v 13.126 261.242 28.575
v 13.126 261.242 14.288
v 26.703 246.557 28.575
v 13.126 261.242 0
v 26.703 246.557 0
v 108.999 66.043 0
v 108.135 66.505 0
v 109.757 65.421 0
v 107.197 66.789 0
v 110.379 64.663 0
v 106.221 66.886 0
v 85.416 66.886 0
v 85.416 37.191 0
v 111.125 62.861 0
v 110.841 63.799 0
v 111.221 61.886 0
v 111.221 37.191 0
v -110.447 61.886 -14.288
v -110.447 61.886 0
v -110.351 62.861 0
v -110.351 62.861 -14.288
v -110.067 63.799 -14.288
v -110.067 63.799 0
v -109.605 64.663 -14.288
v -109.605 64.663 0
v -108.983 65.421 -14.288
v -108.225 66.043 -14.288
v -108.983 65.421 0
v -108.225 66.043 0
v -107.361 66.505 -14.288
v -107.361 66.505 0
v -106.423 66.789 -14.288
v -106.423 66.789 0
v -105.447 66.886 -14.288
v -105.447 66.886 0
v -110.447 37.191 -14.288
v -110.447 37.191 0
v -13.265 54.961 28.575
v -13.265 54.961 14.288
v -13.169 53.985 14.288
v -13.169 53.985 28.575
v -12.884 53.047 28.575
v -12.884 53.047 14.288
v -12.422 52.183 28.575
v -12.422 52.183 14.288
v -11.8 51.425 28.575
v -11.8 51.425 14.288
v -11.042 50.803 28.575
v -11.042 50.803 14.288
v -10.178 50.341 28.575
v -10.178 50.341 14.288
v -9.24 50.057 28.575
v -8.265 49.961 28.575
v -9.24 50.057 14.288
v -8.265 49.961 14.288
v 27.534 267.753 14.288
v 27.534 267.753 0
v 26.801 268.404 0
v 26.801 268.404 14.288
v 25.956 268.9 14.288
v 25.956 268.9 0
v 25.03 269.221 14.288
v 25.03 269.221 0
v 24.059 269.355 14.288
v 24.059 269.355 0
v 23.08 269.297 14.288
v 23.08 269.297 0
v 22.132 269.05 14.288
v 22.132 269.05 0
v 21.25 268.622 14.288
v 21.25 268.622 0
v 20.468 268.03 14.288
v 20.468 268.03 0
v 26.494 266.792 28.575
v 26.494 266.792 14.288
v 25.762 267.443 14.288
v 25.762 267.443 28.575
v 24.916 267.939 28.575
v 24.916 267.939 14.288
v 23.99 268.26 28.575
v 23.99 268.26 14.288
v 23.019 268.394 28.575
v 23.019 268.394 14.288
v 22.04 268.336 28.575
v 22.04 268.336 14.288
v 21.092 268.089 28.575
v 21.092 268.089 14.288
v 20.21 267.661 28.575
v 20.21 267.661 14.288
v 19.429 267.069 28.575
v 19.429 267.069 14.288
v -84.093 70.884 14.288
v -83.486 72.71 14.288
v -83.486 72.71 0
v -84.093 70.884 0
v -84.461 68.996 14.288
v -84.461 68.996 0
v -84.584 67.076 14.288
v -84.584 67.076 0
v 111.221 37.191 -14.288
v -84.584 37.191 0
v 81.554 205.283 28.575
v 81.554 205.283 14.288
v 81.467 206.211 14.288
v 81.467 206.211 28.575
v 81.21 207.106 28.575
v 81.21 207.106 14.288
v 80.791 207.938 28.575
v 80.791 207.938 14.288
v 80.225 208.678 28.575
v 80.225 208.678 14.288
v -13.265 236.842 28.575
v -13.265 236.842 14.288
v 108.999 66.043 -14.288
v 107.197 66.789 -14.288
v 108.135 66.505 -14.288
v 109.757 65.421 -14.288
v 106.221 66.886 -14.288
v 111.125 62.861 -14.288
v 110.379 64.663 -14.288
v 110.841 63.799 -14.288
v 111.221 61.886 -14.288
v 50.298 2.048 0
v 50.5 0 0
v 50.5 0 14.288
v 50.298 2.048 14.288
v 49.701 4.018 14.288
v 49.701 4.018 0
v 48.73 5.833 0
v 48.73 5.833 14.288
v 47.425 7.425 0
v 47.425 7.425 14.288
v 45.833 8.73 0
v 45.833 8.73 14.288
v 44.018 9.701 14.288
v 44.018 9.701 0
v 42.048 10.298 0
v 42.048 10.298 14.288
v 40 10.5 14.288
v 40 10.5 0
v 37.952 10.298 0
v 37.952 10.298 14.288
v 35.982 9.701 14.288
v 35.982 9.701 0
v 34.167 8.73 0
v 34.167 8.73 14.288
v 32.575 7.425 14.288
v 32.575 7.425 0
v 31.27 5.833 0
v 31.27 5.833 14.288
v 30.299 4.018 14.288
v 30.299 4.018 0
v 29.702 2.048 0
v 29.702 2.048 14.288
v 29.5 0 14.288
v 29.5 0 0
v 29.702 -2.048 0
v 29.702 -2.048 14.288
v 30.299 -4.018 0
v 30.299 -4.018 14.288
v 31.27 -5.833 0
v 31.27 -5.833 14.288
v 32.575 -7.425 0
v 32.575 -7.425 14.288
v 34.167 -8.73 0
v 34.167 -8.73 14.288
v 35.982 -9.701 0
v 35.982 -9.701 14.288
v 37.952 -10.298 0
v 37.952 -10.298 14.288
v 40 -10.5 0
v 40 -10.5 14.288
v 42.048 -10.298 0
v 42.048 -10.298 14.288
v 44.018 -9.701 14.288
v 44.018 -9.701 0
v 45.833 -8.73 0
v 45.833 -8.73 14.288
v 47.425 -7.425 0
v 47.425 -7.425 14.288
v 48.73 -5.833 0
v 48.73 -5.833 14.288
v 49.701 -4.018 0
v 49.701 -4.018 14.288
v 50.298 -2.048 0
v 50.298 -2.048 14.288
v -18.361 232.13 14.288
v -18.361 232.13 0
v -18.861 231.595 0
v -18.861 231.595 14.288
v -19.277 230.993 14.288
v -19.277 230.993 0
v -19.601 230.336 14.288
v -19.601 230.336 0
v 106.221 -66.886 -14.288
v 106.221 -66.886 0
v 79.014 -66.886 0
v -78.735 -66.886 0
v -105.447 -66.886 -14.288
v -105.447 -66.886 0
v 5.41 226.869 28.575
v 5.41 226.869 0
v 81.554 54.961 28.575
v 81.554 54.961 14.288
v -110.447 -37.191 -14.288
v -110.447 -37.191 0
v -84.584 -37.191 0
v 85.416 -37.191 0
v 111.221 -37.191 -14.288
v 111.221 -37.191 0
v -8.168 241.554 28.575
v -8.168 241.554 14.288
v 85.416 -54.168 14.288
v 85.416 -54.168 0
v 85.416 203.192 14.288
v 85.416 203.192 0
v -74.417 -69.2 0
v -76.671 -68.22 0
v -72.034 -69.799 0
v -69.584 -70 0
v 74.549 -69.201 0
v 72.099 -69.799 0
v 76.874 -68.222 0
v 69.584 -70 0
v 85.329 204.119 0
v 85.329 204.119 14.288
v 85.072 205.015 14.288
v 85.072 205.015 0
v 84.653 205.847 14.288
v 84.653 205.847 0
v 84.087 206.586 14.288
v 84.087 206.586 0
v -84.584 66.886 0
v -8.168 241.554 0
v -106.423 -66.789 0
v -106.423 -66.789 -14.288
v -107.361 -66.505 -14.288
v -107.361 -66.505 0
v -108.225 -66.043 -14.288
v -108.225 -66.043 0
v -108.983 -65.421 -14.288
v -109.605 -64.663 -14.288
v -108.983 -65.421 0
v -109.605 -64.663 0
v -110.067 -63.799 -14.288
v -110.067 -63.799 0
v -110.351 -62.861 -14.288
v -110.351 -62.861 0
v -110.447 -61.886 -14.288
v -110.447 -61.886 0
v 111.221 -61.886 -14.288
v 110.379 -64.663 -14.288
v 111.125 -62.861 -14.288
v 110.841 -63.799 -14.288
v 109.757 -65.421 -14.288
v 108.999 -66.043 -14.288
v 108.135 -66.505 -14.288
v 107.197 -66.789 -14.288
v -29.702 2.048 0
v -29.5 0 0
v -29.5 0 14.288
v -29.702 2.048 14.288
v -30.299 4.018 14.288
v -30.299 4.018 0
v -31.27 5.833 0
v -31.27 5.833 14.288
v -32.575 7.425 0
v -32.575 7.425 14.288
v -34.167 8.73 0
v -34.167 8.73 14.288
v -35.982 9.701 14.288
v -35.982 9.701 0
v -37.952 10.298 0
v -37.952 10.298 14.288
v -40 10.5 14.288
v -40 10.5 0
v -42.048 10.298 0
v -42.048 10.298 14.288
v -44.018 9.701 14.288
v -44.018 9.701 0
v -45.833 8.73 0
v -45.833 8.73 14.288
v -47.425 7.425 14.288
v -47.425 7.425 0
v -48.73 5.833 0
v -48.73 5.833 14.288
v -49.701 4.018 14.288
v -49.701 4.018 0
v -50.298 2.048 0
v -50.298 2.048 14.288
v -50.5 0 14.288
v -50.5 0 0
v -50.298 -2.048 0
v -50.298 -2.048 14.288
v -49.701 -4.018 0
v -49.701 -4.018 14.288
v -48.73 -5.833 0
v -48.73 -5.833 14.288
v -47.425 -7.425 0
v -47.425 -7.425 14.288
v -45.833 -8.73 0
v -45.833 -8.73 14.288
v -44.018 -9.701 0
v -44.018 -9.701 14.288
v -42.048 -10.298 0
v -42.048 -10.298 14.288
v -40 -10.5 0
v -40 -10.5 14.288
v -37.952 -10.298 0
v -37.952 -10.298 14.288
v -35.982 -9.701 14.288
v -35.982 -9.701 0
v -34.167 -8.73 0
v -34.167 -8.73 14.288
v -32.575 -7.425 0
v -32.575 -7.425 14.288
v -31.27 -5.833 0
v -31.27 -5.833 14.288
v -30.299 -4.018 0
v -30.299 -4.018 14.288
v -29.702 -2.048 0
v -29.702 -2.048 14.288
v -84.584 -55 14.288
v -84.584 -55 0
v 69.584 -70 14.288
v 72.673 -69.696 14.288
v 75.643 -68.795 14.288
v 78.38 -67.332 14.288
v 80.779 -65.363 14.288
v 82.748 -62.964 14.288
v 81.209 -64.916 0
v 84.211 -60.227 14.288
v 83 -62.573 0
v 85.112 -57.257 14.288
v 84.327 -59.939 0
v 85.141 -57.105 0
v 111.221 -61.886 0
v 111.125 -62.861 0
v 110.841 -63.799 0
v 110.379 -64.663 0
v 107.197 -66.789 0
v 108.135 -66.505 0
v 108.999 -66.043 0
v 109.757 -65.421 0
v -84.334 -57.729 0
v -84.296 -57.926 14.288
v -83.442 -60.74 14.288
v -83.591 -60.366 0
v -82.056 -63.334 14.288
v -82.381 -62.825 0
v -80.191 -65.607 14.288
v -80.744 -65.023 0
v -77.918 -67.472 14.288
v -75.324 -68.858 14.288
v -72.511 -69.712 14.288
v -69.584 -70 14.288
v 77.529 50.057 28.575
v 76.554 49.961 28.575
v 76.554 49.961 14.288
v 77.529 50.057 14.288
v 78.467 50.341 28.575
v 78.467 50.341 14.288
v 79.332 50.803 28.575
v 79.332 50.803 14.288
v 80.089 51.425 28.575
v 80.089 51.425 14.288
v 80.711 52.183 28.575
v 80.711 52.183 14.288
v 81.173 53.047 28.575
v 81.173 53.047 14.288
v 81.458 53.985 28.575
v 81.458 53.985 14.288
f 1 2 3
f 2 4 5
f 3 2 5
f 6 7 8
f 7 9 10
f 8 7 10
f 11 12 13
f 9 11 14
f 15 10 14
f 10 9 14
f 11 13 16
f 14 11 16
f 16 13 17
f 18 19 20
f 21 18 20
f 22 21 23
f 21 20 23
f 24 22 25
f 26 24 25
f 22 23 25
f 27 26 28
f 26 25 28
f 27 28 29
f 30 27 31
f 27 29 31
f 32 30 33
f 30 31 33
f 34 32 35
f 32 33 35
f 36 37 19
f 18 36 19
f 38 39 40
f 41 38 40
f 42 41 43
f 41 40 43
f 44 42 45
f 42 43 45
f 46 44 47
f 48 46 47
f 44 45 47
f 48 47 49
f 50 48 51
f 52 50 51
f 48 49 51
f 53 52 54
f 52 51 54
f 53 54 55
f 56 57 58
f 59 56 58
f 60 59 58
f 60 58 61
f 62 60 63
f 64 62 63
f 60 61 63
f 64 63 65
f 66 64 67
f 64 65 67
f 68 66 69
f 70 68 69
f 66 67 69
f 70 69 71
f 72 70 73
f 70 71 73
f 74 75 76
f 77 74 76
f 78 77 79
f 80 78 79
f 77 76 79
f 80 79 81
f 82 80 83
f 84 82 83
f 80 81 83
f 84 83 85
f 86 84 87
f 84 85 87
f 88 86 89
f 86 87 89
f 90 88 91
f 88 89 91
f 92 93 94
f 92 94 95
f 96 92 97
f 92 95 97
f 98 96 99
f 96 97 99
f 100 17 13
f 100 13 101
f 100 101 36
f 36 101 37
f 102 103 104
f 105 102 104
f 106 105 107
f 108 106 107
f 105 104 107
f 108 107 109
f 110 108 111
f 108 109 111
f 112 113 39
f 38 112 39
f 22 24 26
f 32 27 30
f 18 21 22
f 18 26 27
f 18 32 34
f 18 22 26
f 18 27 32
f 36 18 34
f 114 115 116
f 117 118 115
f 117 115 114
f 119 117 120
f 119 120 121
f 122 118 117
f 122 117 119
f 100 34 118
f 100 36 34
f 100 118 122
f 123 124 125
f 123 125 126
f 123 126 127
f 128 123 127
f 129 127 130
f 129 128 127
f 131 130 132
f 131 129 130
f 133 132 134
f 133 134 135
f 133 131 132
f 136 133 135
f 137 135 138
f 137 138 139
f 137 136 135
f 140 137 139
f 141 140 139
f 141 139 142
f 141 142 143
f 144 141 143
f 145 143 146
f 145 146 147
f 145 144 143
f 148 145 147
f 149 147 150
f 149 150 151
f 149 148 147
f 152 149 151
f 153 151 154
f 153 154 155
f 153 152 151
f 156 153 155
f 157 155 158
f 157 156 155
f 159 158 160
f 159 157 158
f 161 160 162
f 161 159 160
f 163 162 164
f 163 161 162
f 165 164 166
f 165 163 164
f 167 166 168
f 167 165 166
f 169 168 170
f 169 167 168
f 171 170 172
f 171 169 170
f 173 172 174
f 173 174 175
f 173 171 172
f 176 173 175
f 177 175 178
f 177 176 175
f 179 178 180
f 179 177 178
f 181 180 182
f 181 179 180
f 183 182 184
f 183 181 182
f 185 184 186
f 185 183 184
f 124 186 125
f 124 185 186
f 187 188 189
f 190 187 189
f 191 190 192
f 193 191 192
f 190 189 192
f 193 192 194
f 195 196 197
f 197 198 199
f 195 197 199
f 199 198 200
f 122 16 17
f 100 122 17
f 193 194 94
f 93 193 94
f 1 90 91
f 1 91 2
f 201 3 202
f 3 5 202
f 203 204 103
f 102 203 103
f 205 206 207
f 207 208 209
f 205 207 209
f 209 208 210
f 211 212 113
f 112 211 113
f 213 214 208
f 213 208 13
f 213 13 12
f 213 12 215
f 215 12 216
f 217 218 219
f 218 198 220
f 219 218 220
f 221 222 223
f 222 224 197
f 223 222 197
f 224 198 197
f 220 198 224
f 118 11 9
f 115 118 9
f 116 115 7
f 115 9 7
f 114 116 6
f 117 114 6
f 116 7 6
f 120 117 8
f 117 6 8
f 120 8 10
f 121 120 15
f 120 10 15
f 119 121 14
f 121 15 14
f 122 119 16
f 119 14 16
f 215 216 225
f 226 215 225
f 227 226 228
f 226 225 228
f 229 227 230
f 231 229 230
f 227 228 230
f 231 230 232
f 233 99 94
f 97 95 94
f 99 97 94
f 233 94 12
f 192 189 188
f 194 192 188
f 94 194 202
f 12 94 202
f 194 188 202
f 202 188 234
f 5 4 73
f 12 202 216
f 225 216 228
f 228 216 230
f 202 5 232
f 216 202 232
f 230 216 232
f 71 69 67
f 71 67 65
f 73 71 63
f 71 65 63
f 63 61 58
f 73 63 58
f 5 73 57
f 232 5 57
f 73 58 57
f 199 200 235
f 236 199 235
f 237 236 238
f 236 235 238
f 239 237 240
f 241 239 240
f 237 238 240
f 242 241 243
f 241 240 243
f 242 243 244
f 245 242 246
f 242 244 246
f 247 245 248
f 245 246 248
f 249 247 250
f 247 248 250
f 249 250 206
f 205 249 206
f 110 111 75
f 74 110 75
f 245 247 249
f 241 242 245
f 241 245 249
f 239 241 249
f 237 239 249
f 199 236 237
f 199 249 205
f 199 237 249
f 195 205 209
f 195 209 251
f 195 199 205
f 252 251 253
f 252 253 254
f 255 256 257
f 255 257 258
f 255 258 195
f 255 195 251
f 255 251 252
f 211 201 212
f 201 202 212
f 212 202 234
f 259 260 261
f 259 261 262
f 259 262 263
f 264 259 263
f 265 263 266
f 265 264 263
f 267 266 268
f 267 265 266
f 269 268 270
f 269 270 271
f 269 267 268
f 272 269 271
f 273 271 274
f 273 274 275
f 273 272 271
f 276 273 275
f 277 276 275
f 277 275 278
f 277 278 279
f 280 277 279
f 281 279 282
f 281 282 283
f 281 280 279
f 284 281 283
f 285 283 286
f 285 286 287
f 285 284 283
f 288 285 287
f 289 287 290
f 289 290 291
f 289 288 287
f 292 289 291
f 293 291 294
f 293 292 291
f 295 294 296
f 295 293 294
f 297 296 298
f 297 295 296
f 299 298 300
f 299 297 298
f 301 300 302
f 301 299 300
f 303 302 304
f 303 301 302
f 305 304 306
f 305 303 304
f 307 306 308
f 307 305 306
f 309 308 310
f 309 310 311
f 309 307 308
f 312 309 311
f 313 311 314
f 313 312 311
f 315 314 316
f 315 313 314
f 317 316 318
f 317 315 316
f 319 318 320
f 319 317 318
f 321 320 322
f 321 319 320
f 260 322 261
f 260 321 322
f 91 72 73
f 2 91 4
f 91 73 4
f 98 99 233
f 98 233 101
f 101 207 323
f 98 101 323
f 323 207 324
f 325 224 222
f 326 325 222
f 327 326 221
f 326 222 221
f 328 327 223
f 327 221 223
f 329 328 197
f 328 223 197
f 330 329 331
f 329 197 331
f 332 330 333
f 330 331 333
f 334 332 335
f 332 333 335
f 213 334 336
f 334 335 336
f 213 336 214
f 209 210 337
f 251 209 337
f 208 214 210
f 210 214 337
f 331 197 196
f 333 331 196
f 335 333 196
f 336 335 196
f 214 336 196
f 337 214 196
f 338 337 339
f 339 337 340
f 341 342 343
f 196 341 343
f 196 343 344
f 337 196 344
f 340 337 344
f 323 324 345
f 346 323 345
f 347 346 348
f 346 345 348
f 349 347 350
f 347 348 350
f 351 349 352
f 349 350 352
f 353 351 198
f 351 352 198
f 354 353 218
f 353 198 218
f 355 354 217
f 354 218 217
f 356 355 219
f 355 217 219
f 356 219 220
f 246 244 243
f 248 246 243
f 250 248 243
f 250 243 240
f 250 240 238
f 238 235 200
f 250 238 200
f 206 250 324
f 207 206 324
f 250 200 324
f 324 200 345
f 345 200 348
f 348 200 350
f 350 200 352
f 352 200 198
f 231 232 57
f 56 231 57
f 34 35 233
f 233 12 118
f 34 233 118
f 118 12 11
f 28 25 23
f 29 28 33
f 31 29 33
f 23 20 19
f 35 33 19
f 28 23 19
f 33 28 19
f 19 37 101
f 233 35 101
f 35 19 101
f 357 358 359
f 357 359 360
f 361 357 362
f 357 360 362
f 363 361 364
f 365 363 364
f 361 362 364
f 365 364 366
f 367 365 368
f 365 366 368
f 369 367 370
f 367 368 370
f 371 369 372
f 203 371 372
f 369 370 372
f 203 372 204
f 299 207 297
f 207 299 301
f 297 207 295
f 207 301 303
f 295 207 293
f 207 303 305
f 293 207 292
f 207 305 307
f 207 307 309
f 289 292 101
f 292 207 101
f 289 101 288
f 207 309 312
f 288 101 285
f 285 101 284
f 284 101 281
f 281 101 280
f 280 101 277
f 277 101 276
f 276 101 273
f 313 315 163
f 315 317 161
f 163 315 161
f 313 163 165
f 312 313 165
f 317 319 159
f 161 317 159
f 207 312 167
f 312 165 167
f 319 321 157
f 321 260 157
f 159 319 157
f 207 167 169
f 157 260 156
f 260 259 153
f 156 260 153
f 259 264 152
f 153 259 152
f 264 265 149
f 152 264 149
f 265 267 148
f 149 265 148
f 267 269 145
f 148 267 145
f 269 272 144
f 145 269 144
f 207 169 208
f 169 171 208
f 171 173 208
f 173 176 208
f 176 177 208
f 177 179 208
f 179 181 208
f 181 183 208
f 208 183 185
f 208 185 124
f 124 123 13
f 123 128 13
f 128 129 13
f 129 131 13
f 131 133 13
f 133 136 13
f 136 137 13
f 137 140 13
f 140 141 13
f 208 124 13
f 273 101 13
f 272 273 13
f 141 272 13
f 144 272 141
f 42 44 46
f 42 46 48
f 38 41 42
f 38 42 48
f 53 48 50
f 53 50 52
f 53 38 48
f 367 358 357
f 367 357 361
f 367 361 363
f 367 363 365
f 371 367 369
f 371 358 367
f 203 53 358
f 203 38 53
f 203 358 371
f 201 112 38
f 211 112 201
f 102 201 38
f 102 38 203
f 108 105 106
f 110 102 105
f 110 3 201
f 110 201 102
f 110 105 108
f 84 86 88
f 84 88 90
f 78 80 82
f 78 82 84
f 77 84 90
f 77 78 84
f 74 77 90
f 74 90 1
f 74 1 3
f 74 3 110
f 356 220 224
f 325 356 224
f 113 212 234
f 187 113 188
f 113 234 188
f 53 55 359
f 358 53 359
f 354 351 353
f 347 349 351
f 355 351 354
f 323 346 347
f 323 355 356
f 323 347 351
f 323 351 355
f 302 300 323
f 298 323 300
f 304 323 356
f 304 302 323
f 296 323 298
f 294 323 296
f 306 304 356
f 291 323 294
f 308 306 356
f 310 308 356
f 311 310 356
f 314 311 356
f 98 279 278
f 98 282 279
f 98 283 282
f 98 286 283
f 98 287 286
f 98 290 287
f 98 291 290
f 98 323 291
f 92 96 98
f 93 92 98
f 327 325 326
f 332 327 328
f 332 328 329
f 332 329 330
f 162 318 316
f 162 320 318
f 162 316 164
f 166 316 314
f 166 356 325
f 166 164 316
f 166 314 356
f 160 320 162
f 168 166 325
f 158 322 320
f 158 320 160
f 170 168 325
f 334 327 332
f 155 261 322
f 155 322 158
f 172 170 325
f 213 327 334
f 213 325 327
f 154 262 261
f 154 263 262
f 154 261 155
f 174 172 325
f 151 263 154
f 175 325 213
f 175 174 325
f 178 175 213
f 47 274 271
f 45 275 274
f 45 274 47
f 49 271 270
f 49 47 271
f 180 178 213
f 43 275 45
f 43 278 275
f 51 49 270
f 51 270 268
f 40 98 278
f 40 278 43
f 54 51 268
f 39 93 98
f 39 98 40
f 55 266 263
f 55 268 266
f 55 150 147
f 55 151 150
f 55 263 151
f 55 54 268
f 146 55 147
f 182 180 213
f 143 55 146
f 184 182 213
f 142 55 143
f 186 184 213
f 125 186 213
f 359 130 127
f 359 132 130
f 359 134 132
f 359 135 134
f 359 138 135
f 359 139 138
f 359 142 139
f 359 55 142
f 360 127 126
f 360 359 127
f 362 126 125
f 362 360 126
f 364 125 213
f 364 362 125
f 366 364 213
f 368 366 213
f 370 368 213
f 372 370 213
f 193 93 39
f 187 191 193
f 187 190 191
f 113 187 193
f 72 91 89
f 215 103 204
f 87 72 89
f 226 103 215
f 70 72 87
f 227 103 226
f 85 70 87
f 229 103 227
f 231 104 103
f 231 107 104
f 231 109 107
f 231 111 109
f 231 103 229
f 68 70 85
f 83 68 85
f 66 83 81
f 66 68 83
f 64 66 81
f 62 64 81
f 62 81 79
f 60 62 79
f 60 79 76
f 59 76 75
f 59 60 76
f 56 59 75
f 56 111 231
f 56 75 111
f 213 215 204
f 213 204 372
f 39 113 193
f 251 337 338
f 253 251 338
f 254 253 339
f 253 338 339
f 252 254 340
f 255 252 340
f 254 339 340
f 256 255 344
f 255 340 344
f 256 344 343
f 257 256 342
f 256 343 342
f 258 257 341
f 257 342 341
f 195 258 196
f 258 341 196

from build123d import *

# Parameters (mm, degrees)
F0_R     = 10.5
F1_DEPTH = 14.2875
F2_W     = 170
F2_H     = 29.6946875751
F3_DEPTH = 14.2875
F5_DEPTH = 14.2875


# Not quite as in the source:
# - a length typed as a fraction of an inch, garbled in the dataset ("3 / 203.2 mm" for 3/8 in), is restored
# - a feature names something its author has since deleted; it is built from what else it names


with BuildPart() as f1:
    # F0 (on Top) → F1 (new body)
    with BuildSketch(Plane.XY):
        with BuildLine():
            ThreePointArc((-84.5842045546, -55), (-80.1908062724, -65.6066017178), (-69.5842045546, -70))
            Line((-69.5842045546, -70), (69.5842045546, -70))
            ThreePointArc((69.5842045546, -70), (80.7788298305, -65.363034385), (85.4157954454, -54.1684091091))
            Line((85.4157954454, -54.1684091091), (85.4157954454, 203.1919921827))
            ThreePointArc((85.4157954454, 203.1919921827), (85.0717839963, 205.0145647093), (84.0870871996, 206.5863429094))
            Line((84.0870871996, 206.5863429094), (27.5340619023, 267.7534620916))
            ThreePointArc((27.5340619023, 267.7534620916), (24.0585970267, 269.3552750765), (20.4684194215, 268.030403119))
            Line((20.4684194215, 268.030403119), (13.1258359132, 261.2417016656))
            Line((13.1258359132, 261.2417016656), (26.70323882, 246.556534649))
            Line((26.70323882, 246.556534649), (16.0564927329, 236.7129175415))
            Line((16.0564927329, 236.7129175415), (5.4097466459, 226.8693004341))
            Line((5.4097466459, 226.8693004341), (-8.1676562609, 241.5544674507))
            Line((-8.1676562609, 241.5544674507), (-18.3614984488, 232.1295897903))
            ThreePointArc((-18.3614984488, 232.1295897903), (-19.0801780579, 231.3013565049), (-19.6010257192, 230.336375433))
            Line((-19.6010257192, 230.336375433), (-83.4858385457, 72.7100555545))
            ThreePointArc((-83.4858385457, 72.7100555545), (-84.3070526124, 69.9459705844), (-84.5842045546, 67.0758233641))
            Line((-84.5842045546, 67.0758233641), (-84.5842045546, -55))
        make_face()
        with Locations((-40, 0)):
            Circle(F0_R, mode=Mode.SUBTRACT)
        with Locations((40, 0)):
            Circle(F0_R, mode=Mode.SUBTRACT)
    extrude(amount=F1_DEPTH)

    # F2 (on face) → F3 (join)
    with BuildSketch(Plane(origin=(0, 0, 0), x_dir=(1, 0, 0), z_dir=(0, 0, -1))):
        with BuildLine():
            ThreePointArc((-110.4471534491, -61.8855160475), (-108.982687355, -65.4210499534), (-105.4471534491, -66.8855160475))
            Line((-105.4471534491, -66.8855160475), (-84.5842045546, -66.8855160475))
            Line((-84.5842045546, -66.8855160475), (-84.5842045546, -37.1908284724))
            Line((-84.5842045546, -37.1908284724), (-110.4471534491, -37.1908284724))
            Line((-110.4471534491, -37.1908284724), (-110.4471534491, -61.8855160475))
        make_face()
        with Locations((0.4157954454, -52.0381722599)):
            Rectangle(F2_W, F2_H)
        with BuildLine():
            Line((85.4157954454, -37.1908284724), (85.4157954454, -66.8855160475))
            Line((85.4157954454, -66.8855160475), (106.2211793661, -66.8855160475))
            ThreePointArc((106.2211793661, -66.8855160475), (109.756713272, -65.4210499534), (111.2211793661, -61.8855160475))
            Line((111.2211793661, -61.8855160475), (111.2211793661, -37.1908284724))
            Line((111.2211793661, -37.1908284724), (85.4157954454, -37.1908284724))
        make_face()
        with BuildLine():
            Line((-84.5842045546, 55), (-84.5842045546, 37.1908284724))
            Line((-84.5842045546, 37.1908284724), (85.4157954454, 37.1908284724))
            Line((85.4157954454, 37.1908284724), (85.4157954454, 54.1684091091))
            ThreePointArc((85.4157954454, 54.1684091091), (83.7249684911, 61.287261926), (79.0136510523, 66.8855160475))
            Line((79.0136510523, 66.8855160475), (-78.7348607215, 66.8855160475))
            ThreePointArc((-78.7348607215, 66.8855160475), (-83.0426562208, 61.623449158), (-84.5842045546, 55))
        make_face()
        with BuildLine():
            Line((-110.4471534491, 37.1908284724), (-84.5842045546, 37.1908284724))
            Line((-84.5842045546, 37.1908284724), (-84.5842045546, 55))
            ThreePointArc((-84.5842045546, 55), (-83.0426562208, 61.623449158), (-78.7348607215, 66.8855160475))
            Line((-78.7348607215, 66.8855160475), (-105.4471534491, 66.8855160475))
            ThreePointArc((-105.4471534491, 66.8855160475), (-108.982687355, 65.4210499534), (-110.4471534491, 61.8855160475))
            Line((-110.4471534491, 61.8855160475), (-110.4471534491, 37.1908284724))
        make_face()
        with BuildLine():
            Line((85.4157954454, 54.1684091091), (85.4157954454, 37.1908284724))
            Line((85.4157954454, 37.1908284724), (111.2211793661, 37.1908284724))
            Line((111.2211793661, 37.1908284724), (111.2211793661, 61.8855160475))
            ThreePointArc((111.2211793661, 61.8855160475), (109.756713272, 65.4210499534), (106.2211793661, 66.8855160475))
            Line((106.2211793661, 66.8855160475), (79.0136510523, 66.8855160475))
            ThreePointArc((79.0136510523, 66.8855160475), (83.7249684911, 61.287261926), (85.4157954454, 54.1684091091))
        make_face()
    extrude(amount=F3_DEPTH)

    # F4 (on face) → F5 (join)
    with BuildSketch(Plane.XY.offset(14.2875)):
        with BuildLine():
            Line((-8.2645773549, 49.9606142757), (76.5538805598, 49.9606142757))
            ThreePointArc((76.5538805598, 49.9606142757), (80.0894144658, 51.4250803698), (81.5538805598, 54.9606142757))
            Line((81.5538805598, 54.9606142757), (81.5538805598, 205.2832095857))
            ThreePointArc((81.5538805598, 205.2832095857), (81.2098691107, 207.1057821123), (80.225172314, 208.6775603124))
            Line((80.225172314, 208.6775603124), (26.4943680898, 266.7921967701))
            ThreePointArc((26.4943680898, 266.7921967701), (23.0189032141, 268.3940097551), (19.4287256089, 267.0691377976))
            Line((19.4287256089, 267.0691377976), (13.1258359132, 261.2417016656))
            Line((13.1258359132, 261.2417016656), (26.70323882, 246.556534649))
            Line((26.70323882, 246.556534649), (5.4097466459, 226.8693004341))
            Line((5.4097466459, 226.8693004341), (-8.1676562609, 241.5544674507))
            Line((-8.1676562609, 241.5544674507), (-13.2645773549, 236.8420286205))
            Line((-13.2645773549, 236.8420286205), (-13.2645773549, 54.9606142757))
            ThreePointArc((-13.2645773549, 54.9606142757), (-11.8001112608, 51.4250803698), (-8.2645773549, 49.9606142757))
        make_face()
    extrude(amount=F5_DEPTH)


solid = f1.part
